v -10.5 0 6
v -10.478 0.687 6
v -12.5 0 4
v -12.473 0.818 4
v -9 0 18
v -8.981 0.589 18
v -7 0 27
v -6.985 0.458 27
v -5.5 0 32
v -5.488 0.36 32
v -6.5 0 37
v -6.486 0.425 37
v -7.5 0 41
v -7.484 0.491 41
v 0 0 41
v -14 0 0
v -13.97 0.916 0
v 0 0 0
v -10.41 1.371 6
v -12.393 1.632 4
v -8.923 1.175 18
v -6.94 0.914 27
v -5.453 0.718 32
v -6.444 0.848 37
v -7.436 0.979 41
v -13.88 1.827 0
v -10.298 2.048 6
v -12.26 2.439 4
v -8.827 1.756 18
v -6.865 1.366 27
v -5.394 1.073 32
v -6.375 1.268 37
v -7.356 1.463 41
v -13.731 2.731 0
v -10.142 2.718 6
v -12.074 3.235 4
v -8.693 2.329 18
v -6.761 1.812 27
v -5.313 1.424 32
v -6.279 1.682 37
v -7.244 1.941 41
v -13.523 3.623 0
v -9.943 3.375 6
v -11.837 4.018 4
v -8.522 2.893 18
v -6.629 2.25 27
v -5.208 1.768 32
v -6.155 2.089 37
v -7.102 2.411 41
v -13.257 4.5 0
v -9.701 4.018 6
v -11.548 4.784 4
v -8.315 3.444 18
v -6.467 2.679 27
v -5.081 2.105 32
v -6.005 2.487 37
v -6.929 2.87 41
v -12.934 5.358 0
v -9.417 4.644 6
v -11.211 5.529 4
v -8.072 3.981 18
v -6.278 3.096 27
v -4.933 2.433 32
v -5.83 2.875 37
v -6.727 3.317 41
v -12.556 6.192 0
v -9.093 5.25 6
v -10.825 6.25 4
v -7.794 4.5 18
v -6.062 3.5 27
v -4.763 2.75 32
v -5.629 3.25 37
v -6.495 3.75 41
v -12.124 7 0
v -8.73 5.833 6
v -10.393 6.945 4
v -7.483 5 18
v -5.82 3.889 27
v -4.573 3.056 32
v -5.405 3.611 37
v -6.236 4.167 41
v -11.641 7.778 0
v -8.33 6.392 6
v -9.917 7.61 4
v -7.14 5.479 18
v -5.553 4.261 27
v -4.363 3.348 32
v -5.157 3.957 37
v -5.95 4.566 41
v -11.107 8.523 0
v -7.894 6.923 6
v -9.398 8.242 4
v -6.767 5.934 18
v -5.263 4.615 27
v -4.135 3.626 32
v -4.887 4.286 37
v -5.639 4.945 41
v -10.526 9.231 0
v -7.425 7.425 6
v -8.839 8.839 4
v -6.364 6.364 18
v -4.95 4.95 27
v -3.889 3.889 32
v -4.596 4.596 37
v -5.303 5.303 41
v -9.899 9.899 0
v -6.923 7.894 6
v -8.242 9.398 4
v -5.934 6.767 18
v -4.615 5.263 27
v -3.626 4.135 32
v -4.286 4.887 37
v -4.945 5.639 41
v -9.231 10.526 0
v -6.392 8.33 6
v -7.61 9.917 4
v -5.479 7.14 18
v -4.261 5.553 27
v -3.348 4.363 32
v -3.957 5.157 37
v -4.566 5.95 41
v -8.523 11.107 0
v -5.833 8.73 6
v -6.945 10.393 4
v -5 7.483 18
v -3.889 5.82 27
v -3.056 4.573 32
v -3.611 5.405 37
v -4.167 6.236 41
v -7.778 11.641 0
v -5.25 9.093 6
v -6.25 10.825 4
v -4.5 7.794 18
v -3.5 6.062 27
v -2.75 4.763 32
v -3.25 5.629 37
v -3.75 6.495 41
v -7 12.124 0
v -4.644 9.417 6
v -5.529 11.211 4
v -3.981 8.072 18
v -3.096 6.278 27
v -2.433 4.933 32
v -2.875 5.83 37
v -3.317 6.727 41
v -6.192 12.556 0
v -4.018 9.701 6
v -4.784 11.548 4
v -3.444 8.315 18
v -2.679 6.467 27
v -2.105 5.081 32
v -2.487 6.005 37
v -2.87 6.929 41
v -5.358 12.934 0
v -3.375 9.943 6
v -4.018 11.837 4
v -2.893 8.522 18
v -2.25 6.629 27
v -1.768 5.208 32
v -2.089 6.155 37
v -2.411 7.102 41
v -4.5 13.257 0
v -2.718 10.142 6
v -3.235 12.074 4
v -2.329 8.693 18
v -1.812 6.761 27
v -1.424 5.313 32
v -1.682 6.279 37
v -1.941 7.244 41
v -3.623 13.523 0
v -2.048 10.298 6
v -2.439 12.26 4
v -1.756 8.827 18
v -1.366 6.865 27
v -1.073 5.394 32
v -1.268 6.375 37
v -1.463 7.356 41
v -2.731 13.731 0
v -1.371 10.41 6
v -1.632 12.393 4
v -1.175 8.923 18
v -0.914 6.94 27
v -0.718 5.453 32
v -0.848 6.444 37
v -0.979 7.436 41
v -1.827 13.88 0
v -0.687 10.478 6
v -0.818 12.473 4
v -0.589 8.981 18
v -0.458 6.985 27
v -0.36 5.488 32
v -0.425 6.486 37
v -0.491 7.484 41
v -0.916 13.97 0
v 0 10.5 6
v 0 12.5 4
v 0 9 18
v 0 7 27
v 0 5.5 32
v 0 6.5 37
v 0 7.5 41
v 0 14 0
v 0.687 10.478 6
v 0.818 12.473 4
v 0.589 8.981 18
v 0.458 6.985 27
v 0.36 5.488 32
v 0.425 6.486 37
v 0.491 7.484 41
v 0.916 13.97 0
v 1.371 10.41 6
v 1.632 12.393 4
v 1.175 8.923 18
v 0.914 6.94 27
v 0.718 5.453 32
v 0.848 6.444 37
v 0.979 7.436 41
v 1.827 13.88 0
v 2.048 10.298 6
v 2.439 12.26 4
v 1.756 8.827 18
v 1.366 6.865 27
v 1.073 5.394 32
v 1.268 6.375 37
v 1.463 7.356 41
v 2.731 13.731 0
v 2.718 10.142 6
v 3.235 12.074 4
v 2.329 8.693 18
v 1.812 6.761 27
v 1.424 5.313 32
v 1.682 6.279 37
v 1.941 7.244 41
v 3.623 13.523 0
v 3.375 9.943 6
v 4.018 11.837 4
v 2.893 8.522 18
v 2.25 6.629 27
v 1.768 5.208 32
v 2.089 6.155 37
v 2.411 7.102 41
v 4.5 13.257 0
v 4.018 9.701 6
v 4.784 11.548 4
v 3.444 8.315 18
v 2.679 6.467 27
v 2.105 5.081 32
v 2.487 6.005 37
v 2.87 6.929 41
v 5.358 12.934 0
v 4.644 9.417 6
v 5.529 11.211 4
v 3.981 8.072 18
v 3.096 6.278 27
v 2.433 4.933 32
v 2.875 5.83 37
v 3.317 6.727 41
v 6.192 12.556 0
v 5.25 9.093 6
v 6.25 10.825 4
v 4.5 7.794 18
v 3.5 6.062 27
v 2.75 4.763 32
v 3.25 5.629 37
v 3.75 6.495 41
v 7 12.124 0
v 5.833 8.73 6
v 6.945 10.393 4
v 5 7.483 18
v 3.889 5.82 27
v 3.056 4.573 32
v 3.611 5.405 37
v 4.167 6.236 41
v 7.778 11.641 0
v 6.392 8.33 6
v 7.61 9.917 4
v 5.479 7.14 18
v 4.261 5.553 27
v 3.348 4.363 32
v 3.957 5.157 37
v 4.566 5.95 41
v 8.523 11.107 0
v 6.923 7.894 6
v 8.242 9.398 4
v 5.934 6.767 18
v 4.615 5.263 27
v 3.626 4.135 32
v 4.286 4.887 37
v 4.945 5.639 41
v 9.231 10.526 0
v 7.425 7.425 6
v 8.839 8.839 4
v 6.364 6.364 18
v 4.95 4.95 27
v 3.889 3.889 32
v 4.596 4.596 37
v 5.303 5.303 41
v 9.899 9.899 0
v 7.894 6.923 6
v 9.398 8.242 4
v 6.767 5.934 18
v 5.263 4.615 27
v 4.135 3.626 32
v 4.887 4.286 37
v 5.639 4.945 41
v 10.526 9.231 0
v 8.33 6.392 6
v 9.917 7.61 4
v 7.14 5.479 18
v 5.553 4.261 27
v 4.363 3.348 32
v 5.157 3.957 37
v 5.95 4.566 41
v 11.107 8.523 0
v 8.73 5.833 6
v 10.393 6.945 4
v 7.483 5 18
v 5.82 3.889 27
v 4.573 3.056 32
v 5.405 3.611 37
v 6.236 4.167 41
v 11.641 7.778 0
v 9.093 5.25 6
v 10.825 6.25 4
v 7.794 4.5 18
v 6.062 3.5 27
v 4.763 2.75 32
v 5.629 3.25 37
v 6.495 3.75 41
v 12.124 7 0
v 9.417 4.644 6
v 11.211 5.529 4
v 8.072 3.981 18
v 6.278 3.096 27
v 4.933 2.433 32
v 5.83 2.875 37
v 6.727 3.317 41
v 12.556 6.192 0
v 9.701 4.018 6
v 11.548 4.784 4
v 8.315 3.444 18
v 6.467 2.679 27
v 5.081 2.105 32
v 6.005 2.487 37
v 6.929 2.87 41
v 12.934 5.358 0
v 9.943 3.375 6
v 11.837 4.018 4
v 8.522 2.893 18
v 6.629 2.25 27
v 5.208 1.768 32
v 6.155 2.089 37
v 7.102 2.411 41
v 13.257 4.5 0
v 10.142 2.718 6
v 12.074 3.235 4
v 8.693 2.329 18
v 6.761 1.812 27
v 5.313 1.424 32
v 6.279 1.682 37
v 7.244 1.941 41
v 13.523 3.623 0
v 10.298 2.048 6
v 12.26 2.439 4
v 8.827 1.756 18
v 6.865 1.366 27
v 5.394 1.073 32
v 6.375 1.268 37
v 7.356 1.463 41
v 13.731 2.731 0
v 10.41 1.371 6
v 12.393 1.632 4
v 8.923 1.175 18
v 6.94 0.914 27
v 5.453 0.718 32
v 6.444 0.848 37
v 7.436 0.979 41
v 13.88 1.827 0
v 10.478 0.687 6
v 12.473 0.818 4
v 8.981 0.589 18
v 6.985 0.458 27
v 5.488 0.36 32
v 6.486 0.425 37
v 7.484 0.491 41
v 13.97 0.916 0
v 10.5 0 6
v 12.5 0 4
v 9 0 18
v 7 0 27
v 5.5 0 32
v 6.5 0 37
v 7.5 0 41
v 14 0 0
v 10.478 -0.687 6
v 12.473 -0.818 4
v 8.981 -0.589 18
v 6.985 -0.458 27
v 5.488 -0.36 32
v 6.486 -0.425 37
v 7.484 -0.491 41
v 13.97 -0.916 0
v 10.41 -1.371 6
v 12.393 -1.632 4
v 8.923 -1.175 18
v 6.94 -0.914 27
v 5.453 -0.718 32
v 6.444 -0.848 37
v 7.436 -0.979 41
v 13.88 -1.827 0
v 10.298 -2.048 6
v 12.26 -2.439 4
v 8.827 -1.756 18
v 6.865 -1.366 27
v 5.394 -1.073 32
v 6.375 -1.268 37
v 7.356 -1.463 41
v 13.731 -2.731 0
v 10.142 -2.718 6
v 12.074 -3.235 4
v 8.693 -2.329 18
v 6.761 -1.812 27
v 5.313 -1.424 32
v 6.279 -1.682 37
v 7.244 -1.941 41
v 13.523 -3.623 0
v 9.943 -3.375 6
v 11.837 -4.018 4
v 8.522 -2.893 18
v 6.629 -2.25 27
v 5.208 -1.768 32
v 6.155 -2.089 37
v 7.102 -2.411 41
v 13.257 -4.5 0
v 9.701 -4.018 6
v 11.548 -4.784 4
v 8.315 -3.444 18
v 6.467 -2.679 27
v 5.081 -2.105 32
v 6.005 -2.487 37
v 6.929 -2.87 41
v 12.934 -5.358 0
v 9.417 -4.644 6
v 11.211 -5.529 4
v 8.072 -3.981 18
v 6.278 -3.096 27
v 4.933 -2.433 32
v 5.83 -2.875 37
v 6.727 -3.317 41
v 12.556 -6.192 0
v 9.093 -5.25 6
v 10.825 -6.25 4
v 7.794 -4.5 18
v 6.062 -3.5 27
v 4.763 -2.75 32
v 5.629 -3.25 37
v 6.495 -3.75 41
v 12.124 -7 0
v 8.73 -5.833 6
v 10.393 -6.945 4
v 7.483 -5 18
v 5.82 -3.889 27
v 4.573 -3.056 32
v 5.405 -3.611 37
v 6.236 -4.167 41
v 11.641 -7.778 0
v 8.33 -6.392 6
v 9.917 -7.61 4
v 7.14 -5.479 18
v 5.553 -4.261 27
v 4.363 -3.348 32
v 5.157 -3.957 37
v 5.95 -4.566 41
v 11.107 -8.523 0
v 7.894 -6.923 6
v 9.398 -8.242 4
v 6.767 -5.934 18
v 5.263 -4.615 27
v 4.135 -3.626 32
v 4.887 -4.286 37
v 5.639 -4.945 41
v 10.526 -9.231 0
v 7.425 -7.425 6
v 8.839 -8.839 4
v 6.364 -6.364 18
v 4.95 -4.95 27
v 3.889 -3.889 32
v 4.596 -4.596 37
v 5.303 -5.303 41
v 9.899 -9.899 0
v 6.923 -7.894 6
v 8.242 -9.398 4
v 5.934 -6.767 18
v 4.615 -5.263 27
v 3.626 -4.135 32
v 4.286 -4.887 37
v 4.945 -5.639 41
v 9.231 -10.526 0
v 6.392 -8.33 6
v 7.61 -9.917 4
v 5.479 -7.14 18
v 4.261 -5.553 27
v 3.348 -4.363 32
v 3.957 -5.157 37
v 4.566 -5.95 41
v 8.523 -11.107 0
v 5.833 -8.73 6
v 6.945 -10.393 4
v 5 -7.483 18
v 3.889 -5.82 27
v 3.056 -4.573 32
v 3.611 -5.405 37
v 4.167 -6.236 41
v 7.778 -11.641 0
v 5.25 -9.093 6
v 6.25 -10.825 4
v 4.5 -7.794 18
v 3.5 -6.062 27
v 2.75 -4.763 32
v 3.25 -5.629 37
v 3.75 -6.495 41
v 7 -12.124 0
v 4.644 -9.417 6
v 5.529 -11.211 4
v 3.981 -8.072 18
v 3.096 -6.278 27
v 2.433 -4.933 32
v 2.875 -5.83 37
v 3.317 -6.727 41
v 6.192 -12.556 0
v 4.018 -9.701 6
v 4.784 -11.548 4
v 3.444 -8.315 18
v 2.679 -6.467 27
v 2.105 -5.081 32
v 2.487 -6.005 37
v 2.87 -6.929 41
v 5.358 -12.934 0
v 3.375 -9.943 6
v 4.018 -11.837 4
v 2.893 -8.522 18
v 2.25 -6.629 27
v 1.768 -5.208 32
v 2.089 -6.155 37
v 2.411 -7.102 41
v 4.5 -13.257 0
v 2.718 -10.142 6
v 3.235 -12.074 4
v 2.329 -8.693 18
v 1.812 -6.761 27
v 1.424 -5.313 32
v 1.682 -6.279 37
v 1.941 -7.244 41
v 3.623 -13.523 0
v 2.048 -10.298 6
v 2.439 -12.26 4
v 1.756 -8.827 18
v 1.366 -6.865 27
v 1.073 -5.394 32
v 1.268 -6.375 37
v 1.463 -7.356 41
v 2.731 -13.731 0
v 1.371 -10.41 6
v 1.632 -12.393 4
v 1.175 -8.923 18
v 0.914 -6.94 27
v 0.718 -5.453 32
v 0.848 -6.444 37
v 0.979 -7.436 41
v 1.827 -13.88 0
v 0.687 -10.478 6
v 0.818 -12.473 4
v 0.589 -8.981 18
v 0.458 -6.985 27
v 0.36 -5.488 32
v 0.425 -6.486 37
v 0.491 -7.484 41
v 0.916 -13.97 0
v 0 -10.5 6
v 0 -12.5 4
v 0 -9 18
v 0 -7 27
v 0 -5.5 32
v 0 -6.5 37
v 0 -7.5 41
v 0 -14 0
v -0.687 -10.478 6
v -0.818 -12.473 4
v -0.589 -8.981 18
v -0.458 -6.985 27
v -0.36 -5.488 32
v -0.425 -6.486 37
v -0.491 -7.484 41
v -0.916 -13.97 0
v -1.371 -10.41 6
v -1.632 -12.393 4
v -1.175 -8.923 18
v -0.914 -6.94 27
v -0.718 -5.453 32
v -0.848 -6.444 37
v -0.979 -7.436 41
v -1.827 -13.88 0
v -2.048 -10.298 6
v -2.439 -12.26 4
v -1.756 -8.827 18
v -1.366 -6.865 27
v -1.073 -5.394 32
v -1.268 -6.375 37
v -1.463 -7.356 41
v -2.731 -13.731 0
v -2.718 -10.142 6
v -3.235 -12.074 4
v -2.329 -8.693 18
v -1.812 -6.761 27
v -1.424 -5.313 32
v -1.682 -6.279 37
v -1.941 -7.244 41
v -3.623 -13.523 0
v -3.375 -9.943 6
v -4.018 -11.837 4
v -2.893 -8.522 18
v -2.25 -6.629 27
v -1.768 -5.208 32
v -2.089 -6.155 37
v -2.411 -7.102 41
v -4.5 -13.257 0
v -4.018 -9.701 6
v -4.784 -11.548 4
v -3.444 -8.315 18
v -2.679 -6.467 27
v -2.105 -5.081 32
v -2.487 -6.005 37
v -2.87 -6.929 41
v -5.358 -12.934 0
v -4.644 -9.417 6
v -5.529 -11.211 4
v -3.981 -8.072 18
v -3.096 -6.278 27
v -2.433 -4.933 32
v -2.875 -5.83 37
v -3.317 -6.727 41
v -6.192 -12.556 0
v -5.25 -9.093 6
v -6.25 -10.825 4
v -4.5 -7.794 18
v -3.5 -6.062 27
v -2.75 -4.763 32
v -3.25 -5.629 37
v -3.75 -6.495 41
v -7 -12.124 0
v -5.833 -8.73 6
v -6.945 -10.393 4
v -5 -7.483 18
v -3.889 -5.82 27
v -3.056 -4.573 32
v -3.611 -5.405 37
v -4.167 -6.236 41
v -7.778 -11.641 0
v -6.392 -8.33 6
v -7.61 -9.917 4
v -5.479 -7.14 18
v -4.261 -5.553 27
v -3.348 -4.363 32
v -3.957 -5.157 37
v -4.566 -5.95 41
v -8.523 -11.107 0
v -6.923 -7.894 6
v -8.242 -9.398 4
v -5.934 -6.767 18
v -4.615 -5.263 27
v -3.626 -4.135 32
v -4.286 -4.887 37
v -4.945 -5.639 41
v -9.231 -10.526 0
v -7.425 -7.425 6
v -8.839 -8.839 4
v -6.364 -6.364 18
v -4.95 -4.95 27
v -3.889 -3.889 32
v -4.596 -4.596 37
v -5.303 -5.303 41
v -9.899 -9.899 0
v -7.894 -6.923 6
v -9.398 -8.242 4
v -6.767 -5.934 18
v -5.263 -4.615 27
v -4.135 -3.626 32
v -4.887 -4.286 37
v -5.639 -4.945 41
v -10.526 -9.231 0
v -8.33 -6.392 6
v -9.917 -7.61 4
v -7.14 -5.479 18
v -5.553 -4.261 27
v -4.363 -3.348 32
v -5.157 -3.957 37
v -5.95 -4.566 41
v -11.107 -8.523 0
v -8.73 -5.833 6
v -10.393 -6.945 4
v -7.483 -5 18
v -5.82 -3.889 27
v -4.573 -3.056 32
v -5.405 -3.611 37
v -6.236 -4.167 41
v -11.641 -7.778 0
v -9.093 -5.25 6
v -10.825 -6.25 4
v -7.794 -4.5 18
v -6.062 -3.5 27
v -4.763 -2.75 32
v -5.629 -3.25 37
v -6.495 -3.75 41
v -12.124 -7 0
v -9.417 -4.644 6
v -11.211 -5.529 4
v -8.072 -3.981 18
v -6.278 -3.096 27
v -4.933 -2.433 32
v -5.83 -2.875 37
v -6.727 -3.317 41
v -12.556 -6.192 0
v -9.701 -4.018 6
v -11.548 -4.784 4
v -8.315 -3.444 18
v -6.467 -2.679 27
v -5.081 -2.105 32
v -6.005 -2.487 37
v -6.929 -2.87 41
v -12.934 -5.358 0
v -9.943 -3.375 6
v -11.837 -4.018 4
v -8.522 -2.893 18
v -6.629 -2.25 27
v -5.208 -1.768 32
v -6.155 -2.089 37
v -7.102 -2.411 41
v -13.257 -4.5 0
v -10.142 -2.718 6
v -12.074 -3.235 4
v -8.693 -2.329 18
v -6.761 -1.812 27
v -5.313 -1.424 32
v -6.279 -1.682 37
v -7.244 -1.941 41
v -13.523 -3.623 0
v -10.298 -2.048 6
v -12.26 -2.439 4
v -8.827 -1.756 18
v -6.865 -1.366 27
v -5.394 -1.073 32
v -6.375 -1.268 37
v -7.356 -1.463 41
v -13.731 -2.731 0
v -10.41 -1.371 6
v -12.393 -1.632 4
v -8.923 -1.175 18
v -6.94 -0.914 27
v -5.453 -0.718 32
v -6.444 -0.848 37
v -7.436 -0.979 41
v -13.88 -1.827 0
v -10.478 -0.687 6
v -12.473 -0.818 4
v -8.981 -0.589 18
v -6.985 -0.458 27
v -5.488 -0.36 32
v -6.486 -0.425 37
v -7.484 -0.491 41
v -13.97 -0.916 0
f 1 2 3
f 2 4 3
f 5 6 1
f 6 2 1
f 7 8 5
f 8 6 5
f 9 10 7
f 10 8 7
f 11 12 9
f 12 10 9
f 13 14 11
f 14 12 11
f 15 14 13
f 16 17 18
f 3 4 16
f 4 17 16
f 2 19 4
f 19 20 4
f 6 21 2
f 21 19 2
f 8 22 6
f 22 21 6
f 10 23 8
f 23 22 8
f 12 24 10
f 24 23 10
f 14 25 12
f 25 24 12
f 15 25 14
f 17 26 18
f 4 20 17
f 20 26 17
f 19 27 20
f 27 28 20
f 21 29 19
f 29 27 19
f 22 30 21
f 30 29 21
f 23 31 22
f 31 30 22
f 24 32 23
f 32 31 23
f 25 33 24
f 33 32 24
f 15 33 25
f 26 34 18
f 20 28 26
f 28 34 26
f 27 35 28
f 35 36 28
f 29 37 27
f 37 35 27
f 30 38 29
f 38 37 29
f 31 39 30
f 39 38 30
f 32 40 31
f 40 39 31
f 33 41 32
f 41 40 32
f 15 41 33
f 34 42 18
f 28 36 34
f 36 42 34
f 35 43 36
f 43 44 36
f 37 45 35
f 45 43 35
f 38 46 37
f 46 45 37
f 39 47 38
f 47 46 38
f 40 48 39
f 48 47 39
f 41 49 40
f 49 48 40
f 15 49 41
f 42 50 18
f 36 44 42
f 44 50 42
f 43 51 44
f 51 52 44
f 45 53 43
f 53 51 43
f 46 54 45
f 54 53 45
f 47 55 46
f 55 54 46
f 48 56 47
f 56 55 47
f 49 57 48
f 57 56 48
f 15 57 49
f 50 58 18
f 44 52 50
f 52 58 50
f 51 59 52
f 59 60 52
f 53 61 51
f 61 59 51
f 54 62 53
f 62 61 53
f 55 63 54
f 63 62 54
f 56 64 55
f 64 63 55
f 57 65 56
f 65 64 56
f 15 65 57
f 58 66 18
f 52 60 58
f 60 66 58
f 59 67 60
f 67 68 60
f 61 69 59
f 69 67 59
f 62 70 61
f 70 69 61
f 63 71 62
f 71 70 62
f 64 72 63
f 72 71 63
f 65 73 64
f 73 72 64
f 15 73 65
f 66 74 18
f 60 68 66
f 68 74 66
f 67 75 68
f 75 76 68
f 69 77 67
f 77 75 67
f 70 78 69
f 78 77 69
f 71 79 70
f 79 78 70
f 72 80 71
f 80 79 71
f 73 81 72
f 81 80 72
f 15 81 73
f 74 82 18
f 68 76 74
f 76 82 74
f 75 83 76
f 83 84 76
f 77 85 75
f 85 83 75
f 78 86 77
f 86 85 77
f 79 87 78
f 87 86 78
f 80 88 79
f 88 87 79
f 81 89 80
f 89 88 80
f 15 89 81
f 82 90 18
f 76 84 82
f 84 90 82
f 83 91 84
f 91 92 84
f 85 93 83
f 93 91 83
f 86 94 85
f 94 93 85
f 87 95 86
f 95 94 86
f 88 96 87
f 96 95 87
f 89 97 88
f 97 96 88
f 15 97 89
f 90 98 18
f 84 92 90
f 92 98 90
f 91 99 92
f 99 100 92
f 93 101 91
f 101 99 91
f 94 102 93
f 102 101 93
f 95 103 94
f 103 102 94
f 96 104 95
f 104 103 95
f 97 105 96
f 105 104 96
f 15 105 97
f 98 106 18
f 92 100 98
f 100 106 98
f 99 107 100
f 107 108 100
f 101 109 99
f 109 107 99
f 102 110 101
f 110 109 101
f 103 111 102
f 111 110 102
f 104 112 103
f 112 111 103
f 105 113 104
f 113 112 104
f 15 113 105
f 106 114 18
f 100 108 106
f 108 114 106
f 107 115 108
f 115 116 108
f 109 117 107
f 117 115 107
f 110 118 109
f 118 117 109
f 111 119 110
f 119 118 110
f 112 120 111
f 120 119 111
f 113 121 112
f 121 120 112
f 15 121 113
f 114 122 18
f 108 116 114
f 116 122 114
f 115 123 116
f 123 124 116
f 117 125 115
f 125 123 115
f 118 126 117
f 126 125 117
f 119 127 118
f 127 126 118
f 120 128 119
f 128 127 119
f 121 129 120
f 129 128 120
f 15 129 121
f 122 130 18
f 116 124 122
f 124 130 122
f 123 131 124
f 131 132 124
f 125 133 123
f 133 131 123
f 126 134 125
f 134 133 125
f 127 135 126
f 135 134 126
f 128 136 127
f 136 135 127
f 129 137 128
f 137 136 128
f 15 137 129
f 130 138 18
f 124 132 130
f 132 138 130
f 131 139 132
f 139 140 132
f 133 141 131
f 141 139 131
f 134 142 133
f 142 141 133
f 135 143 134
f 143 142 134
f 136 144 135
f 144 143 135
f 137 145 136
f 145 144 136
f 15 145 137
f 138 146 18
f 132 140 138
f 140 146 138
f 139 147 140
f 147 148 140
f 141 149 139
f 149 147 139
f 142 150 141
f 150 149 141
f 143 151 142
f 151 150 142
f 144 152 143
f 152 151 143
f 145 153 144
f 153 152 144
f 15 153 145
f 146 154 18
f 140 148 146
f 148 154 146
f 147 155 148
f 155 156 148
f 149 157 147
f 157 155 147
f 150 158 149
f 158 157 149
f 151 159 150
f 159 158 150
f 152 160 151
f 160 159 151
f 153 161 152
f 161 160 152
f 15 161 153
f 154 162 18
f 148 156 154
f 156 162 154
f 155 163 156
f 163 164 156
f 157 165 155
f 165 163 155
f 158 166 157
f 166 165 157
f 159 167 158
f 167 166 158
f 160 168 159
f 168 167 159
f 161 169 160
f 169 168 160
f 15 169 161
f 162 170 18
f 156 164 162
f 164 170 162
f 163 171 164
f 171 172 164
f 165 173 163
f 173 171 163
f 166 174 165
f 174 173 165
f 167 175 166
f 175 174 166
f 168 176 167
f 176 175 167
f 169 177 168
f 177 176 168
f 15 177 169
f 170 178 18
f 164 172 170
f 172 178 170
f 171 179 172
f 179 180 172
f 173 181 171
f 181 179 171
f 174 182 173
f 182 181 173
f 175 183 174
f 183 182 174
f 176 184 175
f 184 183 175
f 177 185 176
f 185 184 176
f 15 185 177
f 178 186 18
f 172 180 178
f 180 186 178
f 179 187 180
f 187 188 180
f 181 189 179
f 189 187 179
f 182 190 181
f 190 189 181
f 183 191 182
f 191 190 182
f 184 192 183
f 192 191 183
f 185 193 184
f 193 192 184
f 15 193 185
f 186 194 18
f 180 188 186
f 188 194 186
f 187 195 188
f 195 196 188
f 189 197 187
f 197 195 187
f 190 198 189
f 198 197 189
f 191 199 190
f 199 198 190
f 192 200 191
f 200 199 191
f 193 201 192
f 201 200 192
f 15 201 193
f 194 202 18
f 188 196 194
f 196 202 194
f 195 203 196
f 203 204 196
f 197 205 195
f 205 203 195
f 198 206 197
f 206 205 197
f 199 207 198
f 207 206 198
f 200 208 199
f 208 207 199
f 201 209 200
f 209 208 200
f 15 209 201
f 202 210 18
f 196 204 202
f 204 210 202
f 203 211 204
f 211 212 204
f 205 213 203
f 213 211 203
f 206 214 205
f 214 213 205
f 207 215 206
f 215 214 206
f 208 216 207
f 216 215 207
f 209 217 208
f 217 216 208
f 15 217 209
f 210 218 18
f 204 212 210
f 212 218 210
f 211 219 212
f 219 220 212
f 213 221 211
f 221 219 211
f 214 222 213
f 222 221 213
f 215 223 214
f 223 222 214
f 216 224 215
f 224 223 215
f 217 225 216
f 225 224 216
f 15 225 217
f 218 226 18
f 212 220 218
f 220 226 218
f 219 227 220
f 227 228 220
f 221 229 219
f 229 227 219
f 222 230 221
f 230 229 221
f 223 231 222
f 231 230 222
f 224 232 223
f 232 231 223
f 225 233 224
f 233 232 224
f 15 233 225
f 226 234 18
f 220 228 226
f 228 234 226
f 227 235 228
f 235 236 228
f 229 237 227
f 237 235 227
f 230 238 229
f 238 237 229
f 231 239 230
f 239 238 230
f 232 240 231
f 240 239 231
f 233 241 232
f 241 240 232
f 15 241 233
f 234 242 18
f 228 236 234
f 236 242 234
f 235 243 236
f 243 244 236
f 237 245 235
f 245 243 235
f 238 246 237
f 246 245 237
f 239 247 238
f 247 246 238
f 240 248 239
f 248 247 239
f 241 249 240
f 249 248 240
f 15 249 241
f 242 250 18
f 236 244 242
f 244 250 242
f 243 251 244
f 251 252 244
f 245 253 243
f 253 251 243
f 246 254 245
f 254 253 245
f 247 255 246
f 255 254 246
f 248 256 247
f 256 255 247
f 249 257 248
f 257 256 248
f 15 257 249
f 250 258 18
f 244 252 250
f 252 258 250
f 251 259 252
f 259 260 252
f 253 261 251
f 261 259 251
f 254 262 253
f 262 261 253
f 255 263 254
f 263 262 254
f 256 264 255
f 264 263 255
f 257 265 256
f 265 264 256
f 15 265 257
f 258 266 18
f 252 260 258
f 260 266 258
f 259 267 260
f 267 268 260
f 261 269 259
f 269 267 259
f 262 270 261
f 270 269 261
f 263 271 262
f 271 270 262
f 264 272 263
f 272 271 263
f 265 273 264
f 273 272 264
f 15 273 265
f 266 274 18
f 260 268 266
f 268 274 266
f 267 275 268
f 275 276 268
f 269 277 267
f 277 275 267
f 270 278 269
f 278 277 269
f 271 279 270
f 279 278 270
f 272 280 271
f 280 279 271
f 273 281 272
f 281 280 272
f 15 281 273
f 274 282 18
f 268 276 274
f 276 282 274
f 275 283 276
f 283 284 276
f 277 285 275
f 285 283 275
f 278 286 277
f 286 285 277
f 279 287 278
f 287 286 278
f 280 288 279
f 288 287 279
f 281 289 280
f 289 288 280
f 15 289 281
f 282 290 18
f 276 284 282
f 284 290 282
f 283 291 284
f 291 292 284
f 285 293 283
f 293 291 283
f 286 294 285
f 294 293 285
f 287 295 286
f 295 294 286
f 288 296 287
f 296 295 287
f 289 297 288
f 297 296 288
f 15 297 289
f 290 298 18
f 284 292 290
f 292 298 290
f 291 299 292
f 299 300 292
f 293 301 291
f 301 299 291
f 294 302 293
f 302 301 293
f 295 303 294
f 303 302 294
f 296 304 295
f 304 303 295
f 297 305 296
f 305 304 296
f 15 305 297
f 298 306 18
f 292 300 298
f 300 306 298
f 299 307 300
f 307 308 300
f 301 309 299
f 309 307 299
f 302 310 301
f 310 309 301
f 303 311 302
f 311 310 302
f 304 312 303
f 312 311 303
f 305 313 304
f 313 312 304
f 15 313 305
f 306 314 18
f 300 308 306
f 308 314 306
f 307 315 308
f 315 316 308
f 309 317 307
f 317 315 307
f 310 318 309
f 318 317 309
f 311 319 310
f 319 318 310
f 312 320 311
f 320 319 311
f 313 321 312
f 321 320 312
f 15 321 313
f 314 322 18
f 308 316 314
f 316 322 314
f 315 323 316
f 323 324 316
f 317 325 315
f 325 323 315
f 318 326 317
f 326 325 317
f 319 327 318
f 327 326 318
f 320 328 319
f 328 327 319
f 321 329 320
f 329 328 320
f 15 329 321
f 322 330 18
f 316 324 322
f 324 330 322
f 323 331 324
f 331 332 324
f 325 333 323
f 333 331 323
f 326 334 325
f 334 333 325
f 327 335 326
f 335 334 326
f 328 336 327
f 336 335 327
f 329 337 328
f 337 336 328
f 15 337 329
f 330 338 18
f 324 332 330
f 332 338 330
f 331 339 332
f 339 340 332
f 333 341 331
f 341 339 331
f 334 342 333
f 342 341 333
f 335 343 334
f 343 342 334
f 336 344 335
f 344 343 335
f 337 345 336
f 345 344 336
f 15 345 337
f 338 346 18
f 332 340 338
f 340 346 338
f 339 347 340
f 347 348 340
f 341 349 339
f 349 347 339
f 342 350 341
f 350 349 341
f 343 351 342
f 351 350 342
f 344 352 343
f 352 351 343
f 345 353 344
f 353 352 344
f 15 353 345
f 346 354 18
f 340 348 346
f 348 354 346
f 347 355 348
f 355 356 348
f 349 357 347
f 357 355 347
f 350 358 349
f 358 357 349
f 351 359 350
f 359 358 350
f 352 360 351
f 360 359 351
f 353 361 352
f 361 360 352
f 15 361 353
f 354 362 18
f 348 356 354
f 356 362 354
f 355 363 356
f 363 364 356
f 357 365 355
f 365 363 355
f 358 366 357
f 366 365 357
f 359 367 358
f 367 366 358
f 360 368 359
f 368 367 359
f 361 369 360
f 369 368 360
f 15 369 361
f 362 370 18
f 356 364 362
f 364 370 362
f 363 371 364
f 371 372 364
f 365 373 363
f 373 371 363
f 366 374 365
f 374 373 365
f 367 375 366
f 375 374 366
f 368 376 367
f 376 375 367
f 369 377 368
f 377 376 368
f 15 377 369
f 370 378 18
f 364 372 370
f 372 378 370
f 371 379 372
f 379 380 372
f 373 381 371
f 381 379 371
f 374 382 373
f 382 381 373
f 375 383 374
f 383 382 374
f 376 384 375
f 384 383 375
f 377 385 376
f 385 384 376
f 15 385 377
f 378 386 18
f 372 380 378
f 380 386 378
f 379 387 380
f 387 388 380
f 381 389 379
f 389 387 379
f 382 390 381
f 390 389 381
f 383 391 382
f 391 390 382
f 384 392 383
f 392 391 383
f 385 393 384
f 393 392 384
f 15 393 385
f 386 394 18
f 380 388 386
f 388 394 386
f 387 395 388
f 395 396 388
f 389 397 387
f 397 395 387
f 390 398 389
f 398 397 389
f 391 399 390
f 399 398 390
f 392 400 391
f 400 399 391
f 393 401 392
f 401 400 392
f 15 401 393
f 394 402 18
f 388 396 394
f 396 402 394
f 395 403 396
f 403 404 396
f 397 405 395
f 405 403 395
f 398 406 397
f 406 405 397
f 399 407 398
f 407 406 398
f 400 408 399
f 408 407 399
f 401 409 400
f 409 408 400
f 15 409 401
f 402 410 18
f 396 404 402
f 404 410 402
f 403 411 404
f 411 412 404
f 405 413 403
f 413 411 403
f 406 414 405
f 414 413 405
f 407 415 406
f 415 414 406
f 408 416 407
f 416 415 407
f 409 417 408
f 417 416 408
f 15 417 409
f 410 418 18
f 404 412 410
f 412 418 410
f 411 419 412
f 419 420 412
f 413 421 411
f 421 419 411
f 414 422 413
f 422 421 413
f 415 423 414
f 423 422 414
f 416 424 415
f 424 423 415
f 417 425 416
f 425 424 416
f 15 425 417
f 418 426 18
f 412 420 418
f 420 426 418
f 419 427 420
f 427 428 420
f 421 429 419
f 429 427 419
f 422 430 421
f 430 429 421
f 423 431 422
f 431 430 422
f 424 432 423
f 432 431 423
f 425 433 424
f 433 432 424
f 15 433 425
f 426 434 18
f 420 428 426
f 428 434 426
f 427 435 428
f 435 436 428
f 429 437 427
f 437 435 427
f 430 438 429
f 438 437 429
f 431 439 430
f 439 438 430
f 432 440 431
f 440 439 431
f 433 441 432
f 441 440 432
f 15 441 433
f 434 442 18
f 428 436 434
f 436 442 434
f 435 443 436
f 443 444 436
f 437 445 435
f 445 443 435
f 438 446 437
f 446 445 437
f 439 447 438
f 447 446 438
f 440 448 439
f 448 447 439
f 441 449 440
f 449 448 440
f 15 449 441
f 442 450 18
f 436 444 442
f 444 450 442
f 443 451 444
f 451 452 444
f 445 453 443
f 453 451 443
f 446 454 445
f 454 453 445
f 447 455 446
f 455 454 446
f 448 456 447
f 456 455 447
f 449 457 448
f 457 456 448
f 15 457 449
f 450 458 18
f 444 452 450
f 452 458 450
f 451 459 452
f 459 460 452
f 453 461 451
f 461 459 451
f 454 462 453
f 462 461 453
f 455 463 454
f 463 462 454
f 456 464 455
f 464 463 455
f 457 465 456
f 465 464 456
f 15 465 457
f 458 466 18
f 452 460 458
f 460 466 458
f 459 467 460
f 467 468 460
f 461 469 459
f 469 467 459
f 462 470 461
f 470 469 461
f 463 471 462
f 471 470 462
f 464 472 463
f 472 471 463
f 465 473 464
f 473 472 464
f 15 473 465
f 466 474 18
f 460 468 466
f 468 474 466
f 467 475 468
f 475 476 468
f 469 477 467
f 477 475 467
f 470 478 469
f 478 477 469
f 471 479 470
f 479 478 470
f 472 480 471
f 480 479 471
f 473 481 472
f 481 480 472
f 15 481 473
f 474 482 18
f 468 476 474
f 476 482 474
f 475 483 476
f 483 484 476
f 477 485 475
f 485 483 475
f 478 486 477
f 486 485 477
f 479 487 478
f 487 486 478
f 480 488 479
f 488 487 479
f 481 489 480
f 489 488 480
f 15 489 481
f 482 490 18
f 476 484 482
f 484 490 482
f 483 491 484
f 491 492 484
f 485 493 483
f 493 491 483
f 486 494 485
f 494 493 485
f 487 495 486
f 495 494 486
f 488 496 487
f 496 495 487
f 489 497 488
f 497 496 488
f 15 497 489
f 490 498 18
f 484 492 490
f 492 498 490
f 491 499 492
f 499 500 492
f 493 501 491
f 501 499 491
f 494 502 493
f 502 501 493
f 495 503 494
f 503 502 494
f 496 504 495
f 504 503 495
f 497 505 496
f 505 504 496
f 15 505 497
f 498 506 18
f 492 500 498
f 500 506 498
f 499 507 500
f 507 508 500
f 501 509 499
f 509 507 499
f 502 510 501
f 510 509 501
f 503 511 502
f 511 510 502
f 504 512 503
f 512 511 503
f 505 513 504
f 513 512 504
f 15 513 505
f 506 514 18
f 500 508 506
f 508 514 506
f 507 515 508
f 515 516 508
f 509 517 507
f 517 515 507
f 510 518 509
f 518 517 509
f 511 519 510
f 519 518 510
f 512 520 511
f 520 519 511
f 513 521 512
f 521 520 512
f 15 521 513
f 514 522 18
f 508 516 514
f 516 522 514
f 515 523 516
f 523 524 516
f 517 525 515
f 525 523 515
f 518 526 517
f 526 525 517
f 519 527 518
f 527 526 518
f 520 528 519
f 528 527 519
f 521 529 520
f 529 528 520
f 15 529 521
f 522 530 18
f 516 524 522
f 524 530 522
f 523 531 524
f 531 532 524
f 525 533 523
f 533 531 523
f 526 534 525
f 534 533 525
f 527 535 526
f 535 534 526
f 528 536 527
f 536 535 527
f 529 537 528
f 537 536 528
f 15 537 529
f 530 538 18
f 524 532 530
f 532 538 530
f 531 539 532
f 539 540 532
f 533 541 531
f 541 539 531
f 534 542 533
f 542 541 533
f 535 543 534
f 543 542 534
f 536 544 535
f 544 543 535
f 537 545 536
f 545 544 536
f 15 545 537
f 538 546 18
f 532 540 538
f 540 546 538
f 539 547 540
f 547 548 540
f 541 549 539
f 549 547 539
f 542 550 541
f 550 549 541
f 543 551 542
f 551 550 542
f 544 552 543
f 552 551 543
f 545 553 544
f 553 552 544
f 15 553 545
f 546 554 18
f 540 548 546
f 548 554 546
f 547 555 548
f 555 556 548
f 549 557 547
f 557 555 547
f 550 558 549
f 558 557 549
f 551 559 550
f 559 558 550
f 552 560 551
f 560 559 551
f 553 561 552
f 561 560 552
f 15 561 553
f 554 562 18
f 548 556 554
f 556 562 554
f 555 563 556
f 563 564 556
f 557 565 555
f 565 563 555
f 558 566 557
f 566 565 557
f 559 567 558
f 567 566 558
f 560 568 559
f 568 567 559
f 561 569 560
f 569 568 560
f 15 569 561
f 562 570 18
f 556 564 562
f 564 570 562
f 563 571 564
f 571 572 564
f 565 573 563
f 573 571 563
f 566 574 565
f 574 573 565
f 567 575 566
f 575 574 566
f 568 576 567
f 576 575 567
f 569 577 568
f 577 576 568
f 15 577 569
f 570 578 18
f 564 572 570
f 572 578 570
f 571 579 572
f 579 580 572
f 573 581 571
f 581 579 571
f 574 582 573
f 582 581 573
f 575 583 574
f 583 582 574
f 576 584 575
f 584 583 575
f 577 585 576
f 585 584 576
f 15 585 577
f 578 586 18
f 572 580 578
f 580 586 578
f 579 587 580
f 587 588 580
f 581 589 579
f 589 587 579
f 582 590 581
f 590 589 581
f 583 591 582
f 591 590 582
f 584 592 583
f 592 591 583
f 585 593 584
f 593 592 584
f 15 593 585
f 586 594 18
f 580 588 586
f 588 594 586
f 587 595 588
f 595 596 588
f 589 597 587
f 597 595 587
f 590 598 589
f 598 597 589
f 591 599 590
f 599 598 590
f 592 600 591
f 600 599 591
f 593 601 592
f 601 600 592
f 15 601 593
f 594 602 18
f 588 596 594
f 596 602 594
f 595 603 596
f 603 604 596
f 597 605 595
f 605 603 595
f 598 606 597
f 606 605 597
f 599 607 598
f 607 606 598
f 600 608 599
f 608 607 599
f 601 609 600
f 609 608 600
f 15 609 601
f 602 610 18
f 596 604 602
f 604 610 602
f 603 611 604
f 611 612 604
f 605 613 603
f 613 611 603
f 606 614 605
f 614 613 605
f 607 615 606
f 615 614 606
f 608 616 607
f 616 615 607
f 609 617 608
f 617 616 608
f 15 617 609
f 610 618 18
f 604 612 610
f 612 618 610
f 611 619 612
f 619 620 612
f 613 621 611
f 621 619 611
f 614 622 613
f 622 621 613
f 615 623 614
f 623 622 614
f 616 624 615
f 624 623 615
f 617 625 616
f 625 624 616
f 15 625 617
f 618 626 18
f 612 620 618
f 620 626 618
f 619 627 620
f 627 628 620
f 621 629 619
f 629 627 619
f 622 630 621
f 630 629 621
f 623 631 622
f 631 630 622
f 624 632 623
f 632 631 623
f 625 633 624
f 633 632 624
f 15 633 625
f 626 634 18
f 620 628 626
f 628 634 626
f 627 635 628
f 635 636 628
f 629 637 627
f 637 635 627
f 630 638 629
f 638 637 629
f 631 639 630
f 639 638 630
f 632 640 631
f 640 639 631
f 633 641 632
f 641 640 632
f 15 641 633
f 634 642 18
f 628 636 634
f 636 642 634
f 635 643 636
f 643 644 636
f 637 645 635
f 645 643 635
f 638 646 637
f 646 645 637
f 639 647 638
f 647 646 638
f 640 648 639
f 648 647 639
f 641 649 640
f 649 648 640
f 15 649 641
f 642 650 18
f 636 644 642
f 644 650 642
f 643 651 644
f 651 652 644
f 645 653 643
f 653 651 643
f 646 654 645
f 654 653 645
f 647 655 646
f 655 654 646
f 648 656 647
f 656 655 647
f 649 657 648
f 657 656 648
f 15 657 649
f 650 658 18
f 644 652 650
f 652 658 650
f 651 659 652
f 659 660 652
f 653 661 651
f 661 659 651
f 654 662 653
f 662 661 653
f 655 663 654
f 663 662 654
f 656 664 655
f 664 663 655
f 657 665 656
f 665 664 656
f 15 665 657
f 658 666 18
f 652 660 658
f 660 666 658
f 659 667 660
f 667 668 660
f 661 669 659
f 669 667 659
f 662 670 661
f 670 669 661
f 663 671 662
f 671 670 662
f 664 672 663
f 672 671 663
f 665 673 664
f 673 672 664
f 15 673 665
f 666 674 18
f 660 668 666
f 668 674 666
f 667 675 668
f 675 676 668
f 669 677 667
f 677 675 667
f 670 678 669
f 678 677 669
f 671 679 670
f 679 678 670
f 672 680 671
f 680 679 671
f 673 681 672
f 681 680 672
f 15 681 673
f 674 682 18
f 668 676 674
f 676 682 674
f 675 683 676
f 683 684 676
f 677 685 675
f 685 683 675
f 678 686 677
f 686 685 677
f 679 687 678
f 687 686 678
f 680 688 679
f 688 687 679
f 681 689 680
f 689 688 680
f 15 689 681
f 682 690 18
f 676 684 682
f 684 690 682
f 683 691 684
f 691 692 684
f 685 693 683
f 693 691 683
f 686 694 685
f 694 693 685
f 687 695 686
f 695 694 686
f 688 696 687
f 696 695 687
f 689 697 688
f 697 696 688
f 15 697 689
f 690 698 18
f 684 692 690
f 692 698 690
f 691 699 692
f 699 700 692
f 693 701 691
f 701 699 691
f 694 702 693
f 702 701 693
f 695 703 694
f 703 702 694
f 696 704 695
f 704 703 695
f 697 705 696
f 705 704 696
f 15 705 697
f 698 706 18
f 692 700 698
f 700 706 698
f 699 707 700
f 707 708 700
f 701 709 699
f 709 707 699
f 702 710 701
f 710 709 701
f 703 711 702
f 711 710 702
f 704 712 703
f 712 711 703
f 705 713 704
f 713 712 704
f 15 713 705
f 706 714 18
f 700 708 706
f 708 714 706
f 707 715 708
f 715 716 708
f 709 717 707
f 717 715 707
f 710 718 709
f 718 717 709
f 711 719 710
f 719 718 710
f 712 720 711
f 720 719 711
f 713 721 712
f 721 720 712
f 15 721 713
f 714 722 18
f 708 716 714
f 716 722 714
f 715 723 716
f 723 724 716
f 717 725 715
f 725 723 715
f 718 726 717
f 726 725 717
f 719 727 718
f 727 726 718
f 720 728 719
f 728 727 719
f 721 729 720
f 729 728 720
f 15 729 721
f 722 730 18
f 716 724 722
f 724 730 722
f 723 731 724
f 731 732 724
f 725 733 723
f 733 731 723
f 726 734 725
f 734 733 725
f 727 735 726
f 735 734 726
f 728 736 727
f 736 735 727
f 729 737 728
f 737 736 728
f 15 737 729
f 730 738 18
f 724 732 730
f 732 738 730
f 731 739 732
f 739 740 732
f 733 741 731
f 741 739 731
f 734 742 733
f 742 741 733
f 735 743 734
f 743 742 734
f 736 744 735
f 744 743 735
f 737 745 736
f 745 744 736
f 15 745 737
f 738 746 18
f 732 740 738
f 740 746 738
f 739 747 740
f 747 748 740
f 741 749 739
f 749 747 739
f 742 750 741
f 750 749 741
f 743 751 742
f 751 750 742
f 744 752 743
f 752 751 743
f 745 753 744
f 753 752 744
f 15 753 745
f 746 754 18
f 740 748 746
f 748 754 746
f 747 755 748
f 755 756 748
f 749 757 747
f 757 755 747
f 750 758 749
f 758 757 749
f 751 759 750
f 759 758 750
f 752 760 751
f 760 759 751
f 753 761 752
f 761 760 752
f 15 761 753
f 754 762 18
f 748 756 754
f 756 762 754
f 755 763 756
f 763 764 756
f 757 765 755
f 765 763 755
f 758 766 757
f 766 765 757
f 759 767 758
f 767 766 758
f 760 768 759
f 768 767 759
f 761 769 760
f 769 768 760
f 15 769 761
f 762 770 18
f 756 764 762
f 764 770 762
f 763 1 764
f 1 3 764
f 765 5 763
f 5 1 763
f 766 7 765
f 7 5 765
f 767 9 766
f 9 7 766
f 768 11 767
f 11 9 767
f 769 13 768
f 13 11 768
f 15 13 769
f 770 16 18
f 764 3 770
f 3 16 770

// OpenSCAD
// Chess Pawn
// Forge3D curated example

$fn = $preview ? 40 : 96;

base_diameter = 28;
base_height = 4;
body_height = 30;
body_max_diameter = 18;
neck_diameter = 11;
head_diameter = 15;

module profile_points() {
  polygon(points = [
    [0, 0],
    [base_diameter / 2, 0],
    [base_diameter / 2 - 1.5, base_height],
    [body_max_diameter / 2 + 1.5, base_height + 2],
    [body_max_diameter / 2, base_height + 14],
    [neck_diameter / 2 + 1.5, base_height + body_height - 7],
    [neck_diameter / 2, base_height + body_height - 2],
    [head_diameter / 2 - 1, base_height + body_height + 3],
    [head_diameter / 2, base_height + body_height + 7],
    [0, base_height + body_height + 7],
  ]);
}

color("Ivory")
rotate_extrude(convexity = 10)
profile_points();
